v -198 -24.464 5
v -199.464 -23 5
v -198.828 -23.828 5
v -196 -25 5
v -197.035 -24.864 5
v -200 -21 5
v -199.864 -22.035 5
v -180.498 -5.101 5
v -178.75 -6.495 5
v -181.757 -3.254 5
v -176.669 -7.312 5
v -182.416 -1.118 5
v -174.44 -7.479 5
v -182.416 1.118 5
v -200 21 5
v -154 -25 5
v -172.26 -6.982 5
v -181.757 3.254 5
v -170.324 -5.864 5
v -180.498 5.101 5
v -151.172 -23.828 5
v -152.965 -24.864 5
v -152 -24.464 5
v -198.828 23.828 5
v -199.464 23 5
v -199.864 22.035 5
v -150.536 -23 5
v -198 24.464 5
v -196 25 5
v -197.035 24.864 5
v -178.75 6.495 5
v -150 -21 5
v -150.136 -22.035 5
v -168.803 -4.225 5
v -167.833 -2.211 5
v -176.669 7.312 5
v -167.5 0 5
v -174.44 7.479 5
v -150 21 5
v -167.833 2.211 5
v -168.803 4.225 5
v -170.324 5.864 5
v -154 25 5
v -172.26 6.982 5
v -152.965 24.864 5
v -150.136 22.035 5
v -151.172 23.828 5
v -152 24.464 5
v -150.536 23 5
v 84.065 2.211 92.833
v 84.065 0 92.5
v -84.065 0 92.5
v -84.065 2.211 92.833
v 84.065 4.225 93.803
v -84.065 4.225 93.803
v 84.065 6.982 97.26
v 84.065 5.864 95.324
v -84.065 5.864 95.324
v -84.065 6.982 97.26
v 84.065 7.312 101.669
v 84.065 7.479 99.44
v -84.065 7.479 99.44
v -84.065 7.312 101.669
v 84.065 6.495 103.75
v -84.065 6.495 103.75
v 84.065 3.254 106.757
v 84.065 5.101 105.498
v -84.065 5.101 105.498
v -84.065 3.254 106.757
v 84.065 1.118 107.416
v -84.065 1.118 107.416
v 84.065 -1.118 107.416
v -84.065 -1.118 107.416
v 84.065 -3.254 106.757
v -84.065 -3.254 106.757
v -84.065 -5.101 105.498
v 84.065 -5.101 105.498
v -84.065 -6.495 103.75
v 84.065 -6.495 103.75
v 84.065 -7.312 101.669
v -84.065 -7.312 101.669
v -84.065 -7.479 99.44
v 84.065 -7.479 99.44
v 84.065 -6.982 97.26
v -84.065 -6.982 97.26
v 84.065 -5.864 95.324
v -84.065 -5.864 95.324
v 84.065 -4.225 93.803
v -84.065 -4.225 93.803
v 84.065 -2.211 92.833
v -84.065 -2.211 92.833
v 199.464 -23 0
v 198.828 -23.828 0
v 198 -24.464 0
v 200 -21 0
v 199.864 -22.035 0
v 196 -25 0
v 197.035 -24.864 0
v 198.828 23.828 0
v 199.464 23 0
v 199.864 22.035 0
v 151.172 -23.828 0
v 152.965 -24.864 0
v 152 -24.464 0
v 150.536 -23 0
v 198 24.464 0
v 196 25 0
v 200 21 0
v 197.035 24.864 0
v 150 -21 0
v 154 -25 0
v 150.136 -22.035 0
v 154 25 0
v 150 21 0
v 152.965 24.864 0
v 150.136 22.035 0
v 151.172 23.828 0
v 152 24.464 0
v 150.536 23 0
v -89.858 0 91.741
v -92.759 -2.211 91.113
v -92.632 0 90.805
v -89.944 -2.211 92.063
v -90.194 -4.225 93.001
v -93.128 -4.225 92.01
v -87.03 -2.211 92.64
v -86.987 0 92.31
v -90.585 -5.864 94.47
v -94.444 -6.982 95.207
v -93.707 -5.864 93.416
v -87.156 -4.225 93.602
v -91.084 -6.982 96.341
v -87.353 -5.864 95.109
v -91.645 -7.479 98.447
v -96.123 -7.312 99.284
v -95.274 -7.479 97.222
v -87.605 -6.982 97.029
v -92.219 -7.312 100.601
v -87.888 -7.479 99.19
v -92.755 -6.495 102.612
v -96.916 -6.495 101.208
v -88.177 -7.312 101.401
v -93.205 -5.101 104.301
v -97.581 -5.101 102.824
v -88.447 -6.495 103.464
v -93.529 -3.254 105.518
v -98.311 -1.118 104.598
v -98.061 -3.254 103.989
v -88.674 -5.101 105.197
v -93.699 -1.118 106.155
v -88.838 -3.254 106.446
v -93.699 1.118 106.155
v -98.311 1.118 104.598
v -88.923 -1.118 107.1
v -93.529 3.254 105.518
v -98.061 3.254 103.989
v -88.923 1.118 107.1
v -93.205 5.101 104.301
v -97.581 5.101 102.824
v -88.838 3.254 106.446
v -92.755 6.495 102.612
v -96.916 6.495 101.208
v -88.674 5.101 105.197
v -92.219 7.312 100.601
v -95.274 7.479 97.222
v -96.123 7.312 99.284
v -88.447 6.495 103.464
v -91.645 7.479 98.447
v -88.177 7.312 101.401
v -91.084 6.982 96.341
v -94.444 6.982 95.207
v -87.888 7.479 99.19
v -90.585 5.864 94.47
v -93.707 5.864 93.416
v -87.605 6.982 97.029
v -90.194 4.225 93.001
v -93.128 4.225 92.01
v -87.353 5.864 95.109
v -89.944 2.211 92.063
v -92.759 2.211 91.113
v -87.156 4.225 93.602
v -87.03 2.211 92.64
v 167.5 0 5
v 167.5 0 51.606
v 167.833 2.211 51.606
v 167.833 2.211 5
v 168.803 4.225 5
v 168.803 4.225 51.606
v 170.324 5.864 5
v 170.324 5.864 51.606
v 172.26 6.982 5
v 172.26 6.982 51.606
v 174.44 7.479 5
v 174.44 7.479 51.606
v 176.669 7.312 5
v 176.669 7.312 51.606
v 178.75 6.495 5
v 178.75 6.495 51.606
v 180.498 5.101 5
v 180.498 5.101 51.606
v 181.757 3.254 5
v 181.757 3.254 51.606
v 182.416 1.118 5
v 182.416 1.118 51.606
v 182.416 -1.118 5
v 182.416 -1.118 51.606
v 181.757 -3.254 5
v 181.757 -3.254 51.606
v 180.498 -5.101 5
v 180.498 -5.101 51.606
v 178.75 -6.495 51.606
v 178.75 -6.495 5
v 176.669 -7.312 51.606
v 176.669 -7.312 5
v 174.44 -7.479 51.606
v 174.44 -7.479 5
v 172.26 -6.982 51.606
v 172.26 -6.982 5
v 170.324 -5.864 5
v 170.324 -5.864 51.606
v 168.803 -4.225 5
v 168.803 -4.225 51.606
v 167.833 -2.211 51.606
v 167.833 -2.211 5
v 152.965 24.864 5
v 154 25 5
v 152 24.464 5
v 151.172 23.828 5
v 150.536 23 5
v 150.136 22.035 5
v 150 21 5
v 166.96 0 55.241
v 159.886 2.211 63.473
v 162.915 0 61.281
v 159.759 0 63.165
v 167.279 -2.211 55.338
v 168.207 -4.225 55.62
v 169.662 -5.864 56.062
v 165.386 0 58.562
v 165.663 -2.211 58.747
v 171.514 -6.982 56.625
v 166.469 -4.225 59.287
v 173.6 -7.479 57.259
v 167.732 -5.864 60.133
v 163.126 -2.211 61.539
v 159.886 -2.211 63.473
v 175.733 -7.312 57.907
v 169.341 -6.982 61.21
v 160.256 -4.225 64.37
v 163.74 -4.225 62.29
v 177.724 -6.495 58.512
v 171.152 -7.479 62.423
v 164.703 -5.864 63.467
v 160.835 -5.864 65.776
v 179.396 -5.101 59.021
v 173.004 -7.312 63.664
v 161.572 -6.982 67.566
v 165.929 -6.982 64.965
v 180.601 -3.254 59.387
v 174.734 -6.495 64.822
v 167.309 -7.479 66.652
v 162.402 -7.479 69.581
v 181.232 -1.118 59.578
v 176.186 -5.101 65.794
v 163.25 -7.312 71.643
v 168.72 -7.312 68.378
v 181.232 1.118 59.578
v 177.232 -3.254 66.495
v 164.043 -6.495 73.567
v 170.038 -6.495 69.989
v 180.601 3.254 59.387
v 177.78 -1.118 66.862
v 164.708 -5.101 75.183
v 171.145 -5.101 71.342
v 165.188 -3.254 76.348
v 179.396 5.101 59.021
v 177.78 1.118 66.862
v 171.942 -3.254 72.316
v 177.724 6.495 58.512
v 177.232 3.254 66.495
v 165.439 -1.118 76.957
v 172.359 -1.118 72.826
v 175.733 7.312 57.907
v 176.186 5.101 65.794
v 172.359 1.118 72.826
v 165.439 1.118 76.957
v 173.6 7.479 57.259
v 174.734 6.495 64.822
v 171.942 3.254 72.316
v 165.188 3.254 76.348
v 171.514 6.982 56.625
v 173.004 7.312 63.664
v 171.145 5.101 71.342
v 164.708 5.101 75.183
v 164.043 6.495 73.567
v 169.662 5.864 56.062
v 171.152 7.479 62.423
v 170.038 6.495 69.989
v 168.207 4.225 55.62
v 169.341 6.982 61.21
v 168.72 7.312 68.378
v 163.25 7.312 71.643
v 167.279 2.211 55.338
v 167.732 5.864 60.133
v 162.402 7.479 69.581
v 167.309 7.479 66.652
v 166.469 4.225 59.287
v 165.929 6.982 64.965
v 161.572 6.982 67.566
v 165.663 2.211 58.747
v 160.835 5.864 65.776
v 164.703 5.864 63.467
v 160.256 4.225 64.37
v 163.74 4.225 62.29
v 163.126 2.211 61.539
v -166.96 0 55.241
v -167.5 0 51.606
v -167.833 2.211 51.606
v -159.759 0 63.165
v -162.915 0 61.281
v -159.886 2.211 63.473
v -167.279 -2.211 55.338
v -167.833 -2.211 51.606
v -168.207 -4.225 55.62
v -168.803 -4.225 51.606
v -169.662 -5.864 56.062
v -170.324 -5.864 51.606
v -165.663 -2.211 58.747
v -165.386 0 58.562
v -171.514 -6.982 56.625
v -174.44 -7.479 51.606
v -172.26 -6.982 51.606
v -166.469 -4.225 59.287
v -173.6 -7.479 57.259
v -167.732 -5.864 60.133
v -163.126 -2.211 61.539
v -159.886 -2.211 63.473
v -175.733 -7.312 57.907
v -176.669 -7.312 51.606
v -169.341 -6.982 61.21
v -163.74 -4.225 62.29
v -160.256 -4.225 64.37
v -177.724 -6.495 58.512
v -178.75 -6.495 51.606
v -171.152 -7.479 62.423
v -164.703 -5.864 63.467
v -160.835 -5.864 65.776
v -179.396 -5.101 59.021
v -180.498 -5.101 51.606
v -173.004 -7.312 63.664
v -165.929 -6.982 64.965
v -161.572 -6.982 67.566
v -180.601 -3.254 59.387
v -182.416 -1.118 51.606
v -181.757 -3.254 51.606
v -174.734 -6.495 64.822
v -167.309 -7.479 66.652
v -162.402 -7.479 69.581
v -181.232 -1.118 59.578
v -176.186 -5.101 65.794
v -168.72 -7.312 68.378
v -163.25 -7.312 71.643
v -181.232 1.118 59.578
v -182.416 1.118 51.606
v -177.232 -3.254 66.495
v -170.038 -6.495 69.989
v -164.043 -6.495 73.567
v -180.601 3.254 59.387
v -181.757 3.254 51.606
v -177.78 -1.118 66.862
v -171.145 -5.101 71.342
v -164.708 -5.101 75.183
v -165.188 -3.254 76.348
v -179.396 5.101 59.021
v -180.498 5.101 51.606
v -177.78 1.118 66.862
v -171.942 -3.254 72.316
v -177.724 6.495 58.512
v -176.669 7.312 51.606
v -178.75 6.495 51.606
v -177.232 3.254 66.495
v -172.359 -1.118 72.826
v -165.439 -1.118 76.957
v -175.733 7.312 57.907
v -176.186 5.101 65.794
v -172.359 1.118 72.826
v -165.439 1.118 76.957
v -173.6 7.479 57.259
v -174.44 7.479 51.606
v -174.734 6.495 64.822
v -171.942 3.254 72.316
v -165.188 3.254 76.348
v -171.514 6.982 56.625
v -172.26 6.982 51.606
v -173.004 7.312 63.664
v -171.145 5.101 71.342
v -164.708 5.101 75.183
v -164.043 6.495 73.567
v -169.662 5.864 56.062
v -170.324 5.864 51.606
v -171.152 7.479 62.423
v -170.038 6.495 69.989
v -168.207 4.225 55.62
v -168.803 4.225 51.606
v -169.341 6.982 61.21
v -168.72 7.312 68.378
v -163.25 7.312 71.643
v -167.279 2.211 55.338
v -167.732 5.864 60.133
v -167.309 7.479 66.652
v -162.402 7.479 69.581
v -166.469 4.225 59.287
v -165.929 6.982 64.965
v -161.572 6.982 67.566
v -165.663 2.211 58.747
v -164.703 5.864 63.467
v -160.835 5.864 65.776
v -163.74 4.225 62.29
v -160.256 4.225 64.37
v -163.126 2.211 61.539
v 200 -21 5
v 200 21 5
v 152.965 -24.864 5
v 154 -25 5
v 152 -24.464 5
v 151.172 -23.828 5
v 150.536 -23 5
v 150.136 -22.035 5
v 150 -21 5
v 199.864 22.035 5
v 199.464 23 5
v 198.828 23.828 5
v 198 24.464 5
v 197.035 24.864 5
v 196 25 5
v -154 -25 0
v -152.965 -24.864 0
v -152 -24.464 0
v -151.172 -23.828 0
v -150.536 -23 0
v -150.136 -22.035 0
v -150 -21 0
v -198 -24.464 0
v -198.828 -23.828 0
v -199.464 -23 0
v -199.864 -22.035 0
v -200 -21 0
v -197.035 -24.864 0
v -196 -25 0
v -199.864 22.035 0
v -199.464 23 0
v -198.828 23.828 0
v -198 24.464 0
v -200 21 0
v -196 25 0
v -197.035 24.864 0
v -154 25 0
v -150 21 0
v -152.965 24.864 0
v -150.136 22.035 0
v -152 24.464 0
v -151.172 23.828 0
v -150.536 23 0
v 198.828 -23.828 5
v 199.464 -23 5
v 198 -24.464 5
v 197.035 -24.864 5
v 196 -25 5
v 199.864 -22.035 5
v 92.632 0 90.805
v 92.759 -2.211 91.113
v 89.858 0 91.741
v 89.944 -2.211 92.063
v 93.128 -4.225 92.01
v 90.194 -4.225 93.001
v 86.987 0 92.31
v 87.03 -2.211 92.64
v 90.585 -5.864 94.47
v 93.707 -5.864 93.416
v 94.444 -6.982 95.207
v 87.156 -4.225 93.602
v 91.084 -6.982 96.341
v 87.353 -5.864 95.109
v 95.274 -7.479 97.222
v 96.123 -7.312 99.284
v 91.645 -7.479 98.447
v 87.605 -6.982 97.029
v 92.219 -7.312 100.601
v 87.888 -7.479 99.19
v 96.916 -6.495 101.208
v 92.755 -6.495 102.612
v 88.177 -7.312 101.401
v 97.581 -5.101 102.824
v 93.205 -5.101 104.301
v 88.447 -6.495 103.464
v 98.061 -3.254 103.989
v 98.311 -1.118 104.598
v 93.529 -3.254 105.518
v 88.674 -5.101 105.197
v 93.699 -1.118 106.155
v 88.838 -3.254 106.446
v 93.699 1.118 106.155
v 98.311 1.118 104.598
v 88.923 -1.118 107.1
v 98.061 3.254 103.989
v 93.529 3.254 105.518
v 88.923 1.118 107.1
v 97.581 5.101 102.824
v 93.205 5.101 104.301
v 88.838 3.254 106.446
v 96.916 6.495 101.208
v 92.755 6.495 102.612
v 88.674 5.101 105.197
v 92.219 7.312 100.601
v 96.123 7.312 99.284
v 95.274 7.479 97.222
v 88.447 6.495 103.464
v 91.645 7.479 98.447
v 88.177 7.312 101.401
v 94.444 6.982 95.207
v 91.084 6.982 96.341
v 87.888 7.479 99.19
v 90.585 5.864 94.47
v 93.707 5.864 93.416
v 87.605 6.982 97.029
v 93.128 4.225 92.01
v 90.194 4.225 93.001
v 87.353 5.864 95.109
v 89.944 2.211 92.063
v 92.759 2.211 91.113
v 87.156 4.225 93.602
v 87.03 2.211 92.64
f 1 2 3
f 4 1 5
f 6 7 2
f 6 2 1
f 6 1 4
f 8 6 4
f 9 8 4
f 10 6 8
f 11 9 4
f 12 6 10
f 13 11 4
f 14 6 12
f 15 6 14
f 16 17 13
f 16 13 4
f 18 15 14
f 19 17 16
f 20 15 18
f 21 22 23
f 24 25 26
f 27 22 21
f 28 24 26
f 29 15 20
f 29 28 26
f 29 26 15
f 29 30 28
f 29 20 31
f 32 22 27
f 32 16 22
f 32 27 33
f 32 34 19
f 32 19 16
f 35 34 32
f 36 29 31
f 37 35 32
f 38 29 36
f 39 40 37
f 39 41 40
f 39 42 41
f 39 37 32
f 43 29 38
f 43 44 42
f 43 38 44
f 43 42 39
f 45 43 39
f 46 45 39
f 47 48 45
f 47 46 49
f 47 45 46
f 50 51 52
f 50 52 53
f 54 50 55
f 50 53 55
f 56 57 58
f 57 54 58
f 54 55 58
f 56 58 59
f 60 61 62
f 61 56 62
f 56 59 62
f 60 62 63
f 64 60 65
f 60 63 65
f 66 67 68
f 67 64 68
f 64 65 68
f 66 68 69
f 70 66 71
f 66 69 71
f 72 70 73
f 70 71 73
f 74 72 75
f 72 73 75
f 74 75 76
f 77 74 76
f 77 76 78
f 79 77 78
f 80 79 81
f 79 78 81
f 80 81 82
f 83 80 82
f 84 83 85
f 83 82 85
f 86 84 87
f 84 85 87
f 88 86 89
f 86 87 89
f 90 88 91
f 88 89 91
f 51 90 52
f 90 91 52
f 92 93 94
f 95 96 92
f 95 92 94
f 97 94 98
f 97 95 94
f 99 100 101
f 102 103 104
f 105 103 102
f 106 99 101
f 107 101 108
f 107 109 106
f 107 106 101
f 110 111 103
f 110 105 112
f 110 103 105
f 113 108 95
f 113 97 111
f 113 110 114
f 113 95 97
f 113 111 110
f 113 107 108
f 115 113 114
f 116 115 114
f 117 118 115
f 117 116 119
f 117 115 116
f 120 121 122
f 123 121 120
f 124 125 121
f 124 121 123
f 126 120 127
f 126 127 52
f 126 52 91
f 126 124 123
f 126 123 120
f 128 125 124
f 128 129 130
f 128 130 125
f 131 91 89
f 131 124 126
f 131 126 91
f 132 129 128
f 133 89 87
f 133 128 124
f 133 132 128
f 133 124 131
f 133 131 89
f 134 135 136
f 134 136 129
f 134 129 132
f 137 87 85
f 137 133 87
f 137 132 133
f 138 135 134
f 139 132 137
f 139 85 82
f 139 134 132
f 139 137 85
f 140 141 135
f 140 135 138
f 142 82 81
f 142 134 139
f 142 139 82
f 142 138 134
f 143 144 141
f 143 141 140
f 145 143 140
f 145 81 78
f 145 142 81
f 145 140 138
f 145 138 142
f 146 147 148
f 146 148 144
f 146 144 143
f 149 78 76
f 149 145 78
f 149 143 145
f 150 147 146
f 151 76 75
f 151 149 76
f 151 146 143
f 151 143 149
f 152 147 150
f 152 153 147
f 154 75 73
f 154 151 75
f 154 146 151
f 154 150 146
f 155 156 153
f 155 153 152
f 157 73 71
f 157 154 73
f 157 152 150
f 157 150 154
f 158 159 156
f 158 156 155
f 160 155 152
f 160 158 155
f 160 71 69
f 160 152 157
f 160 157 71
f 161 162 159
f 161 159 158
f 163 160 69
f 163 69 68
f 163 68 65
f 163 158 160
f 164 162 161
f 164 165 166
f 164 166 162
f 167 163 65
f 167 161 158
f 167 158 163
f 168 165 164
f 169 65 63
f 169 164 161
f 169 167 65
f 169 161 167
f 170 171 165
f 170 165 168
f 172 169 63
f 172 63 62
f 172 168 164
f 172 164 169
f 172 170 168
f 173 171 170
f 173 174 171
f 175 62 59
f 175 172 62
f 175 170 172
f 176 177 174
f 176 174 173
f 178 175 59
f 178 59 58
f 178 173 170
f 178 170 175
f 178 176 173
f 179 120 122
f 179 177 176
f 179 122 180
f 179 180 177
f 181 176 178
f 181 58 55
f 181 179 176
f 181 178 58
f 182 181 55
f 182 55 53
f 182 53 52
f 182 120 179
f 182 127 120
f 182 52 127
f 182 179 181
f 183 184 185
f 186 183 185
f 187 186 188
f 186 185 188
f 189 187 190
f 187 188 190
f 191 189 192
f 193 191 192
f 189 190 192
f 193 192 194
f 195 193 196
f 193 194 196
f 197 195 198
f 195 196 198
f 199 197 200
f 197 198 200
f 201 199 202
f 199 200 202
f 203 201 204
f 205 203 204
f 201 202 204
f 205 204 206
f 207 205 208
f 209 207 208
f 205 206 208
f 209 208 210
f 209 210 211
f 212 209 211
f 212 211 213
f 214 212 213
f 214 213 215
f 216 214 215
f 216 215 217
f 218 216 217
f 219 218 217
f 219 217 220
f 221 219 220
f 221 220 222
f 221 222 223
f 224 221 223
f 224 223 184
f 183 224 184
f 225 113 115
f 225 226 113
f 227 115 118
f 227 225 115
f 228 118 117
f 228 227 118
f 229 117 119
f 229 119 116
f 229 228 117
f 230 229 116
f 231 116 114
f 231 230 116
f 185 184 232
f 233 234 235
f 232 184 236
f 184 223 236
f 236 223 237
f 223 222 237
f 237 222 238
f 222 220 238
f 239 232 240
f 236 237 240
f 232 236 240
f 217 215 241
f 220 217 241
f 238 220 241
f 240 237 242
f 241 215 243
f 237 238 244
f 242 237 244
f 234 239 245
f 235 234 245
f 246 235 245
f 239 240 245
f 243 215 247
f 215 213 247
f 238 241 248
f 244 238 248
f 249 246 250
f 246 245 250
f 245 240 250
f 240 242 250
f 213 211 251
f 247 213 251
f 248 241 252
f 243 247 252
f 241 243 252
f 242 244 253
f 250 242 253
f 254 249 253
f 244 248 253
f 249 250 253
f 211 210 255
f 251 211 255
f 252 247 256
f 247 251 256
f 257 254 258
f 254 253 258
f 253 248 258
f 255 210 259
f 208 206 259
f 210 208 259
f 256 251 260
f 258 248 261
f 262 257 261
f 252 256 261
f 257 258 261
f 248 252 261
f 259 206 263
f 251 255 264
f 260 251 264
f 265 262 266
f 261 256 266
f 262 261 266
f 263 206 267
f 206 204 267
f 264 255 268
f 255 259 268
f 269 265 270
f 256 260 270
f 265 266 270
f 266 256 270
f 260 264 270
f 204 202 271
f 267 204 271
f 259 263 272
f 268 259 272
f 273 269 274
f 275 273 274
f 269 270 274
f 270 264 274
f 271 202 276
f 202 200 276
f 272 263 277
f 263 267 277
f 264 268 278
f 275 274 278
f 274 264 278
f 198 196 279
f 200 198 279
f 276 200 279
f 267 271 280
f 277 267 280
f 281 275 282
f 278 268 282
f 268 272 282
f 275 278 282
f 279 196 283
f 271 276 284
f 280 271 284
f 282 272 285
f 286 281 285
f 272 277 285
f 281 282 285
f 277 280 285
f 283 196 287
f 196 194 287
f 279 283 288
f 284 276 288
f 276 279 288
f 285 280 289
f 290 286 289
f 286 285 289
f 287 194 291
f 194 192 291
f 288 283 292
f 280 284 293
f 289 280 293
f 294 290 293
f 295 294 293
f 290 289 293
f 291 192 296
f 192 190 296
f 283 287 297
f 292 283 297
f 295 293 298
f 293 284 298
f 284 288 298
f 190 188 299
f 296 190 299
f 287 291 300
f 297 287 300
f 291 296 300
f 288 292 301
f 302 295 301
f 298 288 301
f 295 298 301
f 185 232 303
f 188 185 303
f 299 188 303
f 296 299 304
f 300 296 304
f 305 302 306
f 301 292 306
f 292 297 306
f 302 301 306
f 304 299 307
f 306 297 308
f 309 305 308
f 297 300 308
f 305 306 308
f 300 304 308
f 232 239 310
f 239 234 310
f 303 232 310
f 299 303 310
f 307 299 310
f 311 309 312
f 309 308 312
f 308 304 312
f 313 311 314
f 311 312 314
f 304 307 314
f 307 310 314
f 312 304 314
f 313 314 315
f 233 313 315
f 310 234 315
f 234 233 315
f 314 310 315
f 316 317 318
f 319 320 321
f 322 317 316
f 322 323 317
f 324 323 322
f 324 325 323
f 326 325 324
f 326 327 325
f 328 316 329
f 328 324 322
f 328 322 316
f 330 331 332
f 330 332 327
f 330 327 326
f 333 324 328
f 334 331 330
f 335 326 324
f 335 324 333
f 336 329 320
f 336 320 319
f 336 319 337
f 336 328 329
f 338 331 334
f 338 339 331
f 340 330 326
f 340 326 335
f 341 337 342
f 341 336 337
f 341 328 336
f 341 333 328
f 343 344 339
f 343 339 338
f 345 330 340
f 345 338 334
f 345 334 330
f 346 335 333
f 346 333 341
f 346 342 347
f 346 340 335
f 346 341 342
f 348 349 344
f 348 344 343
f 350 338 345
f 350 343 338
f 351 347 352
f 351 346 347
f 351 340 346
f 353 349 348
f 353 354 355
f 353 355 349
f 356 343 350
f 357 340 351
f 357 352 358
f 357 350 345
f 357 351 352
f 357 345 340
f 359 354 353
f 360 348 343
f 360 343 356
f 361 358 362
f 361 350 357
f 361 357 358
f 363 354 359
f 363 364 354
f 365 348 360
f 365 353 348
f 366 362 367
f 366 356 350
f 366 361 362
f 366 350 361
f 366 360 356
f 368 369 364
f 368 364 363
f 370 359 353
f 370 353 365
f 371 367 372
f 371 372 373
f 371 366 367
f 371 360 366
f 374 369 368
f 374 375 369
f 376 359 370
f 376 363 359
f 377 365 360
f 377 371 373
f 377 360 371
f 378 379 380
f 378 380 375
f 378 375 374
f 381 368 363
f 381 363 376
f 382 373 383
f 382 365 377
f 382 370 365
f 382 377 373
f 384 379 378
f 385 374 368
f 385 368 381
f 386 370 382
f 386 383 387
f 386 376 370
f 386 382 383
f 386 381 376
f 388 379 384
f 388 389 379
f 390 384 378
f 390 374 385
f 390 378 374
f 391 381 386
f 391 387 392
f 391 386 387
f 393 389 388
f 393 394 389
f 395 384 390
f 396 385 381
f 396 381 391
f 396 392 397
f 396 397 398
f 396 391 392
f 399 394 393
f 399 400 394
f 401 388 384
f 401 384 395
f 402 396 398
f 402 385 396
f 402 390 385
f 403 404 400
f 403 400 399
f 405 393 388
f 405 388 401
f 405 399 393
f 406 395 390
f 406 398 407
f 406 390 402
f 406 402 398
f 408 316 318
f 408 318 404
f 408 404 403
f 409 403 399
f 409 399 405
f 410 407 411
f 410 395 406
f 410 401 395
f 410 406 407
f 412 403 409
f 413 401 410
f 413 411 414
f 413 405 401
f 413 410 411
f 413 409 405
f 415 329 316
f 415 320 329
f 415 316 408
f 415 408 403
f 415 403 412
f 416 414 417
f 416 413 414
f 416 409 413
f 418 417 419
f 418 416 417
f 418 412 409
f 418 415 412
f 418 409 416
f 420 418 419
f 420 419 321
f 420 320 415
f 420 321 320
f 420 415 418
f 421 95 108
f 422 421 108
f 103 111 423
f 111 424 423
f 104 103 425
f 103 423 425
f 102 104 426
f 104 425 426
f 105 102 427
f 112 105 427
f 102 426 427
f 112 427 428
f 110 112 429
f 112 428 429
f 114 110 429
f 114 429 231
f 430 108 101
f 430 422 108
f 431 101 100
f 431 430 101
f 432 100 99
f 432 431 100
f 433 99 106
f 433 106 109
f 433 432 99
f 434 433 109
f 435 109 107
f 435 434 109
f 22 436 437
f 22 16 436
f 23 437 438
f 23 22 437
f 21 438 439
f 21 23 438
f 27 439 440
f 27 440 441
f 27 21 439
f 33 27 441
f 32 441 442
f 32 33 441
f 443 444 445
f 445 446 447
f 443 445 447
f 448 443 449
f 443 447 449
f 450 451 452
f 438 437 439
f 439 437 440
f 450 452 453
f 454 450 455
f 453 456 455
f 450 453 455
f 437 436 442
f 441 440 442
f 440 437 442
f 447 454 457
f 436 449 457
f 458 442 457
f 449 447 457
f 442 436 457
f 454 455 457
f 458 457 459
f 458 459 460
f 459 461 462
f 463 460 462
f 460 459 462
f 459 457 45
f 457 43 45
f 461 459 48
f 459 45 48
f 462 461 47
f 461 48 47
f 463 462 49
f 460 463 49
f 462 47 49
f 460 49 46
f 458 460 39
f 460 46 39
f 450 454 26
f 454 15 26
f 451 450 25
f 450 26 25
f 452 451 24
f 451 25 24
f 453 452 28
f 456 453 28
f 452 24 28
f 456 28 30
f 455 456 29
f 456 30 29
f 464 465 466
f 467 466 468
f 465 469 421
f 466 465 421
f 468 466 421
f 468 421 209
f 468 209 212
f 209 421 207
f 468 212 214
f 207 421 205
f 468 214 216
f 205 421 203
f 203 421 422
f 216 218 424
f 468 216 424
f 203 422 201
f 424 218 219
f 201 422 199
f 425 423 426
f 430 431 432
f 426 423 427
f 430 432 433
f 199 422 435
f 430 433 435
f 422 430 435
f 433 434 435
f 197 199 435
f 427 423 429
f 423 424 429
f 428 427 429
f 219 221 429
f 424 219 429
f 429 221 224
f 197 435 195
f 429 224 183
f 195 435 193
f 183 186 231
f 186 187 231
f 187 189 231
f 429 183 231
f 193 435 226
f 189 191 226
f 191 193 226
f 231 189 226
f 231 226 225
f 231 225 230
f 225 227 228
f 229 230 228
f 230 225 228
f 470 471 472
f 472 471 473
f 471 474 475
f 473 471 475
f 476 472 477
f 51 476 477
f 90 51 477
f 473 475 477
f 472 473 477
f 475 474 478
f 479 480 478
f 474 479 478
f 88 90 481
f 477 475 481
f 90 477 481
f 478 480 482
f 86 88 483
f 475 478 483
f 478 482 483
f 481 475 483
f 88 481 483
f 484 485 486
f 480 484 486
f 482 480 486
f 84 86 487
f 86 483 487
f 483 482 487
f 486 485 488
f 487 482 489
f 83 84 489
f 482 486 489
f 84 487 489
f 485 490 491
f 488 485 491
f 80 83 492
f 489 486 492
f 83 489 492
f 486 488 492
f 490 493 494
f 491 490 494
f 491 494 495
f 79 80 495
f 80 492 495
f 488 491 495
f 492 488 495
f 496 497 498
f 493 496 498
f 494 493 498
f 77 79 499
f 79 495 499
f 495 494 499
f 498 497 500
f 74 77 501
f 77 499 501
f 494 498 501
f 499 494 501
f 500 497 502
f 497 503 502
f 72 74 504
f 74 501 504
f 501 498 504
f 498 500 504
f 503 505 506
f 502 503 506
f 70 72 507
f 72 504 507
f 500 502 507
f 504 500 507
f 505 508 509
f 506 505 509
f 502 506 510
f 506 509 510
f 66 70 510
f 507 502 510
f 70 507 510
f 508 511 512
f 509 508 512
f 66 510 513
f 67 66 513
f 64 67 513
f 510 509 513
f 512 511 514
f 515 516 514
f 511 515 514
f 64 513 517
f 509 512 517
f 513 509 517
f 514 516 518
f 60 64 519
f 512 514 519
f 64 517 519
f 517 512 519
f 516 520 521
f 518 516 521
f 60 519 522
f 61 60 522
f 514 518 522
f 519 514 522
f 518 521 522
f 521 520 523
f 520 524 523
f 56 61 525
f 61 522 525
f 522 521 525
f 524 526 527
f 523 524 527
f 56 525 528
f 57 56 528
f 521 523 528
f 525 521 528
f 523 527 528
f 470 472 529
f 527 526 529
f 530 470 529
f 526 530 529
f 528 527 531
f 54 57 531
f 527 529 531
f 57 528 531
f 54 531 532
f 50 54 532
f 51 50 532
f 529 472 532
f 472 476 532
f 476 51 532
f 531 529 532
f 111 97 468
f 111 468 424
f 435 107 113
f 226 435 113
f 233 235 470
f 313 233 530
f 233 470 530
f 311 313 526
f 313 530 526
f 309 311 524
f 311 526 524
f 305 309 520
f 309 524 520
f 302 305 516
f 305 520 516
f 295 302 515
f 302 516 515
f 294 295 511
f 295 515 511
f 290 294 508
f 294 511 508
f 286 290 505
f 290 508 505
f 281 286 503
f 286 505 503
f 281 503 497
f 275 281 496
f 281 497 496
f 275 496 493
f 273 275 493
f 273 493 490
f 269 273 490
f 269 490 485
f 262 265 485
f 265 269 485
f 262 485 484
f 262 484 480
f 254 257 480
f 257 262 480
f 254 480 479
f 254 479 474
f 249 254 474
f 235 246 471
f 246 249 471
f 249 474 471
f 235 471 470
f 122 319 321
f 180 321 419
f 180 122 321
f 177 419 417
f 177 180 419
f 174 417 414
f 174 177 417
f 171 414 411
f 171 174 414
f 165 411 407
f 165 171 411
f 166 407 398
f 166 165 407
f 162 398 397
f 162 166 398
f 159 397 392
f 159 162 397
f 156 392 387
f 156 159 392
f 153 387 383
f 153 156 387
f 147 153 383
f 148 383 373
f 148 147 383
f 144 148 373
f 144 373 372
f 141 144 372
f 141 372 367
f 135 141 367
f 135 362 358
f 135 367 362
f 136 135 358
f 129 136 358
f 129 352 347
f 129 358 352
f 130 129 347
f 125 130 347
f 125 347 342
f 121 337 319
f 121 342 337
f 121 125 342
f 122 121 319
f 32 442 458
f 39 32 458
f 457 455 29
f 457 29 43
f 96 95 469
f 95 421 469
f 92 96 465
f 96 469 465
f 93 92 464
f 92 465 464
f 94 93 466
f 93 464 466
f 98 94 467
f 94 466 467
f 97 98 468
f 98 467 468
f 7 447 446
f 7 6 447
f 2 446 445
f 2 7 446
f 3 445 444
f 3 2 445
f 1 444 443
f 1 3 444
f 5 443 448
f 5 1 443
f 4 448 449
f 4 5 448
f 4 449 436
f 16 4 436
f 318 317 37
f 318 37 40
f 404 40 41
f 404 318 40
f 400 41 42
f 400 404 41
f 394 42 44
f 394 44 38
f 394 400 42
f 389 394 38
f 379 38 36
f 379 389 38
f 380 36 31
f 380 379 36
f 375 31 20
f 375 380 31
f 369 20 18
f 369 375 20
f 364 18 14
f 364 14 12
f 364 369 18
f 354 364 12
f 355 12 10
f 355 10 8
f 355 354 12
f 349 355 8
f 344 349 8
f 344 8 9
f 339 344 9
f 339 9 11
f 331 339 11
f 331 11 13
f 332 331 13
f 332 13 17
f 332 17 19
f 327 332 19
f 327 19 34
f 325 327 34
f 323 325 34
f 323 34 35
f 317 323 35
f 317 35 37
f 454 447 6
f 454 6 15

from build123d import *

# Parameters (mm, degrees)
SKETCH1_W           = 50
SKETCH1_H           = 50
BOSS_EXTRUDE1_DEPTH = 5
SWEEP1_PROFILE_R    = 7.5
FILLET1_R           = 4


with BuildPart() as part:
    # Sketch1 → Boss-Extrude1 (new body)
    with BuildSketch(Plane.XY):
        with Locations((-175, 0)):
            Rectangle(SKETCH1_W, SKETCH1_H)
    extrude(amount=BOSS_EXTRUDE1_DEPTH)

    # Sweep1: sweep along a path in Sketch2
    with BuildLine(Plane(origin=(0, 0, 0), x_dir=(1, 0, 0), z_dir=(0, 1, 0))) as sweep1_path:
        Line((-175, -5), (-175, -51.606145517))
        ThreePointArc((-175, -51.606145517), (-171.61776041, -62.734938755), (-162.614996105, -70.099707486))
        Line((-162.614996105, -70.099707486), (-95.48773854, -97.740342954))
        ThreePointArc((-95.48773854, -97.740342954), (-89.887173245, -99.42966436), (-84.065244382, -100))
        Line((-84.065244382, -100), (0, -100))
    # Sweep1 profile (on start of the path) → Sweep1 (sweep)
    with BuildSketch(Plane(origin=(-175, 0, 5), x_dir=(1, 0, 0), z_dir=(0, 0, 1))):
        Circle(SWEEP1_PROFILE_R)
    sweep(path=sweep1_path.line)

    # Fillet1
    fillet1_edges = [part.edges().sort_by_distance(p)[0] for p in [
        (-150, -25, 2.5),
        (-200, -25, 2.5),
        (-200, 25, 2.5),
        (-150, 25, 2.5),
    ]]
    fillet(fillet1_edges, radius=FILLET1_R)

    # Mirror1: part across plane


with BuildPart() as part_1:
    add(part.part)
    add(part.part.mirror(Plane(origin=(0, 0, 0), x_dir=(0, 0, 1), z_dir=(1, 0, 0))))


solid = part_1.part
